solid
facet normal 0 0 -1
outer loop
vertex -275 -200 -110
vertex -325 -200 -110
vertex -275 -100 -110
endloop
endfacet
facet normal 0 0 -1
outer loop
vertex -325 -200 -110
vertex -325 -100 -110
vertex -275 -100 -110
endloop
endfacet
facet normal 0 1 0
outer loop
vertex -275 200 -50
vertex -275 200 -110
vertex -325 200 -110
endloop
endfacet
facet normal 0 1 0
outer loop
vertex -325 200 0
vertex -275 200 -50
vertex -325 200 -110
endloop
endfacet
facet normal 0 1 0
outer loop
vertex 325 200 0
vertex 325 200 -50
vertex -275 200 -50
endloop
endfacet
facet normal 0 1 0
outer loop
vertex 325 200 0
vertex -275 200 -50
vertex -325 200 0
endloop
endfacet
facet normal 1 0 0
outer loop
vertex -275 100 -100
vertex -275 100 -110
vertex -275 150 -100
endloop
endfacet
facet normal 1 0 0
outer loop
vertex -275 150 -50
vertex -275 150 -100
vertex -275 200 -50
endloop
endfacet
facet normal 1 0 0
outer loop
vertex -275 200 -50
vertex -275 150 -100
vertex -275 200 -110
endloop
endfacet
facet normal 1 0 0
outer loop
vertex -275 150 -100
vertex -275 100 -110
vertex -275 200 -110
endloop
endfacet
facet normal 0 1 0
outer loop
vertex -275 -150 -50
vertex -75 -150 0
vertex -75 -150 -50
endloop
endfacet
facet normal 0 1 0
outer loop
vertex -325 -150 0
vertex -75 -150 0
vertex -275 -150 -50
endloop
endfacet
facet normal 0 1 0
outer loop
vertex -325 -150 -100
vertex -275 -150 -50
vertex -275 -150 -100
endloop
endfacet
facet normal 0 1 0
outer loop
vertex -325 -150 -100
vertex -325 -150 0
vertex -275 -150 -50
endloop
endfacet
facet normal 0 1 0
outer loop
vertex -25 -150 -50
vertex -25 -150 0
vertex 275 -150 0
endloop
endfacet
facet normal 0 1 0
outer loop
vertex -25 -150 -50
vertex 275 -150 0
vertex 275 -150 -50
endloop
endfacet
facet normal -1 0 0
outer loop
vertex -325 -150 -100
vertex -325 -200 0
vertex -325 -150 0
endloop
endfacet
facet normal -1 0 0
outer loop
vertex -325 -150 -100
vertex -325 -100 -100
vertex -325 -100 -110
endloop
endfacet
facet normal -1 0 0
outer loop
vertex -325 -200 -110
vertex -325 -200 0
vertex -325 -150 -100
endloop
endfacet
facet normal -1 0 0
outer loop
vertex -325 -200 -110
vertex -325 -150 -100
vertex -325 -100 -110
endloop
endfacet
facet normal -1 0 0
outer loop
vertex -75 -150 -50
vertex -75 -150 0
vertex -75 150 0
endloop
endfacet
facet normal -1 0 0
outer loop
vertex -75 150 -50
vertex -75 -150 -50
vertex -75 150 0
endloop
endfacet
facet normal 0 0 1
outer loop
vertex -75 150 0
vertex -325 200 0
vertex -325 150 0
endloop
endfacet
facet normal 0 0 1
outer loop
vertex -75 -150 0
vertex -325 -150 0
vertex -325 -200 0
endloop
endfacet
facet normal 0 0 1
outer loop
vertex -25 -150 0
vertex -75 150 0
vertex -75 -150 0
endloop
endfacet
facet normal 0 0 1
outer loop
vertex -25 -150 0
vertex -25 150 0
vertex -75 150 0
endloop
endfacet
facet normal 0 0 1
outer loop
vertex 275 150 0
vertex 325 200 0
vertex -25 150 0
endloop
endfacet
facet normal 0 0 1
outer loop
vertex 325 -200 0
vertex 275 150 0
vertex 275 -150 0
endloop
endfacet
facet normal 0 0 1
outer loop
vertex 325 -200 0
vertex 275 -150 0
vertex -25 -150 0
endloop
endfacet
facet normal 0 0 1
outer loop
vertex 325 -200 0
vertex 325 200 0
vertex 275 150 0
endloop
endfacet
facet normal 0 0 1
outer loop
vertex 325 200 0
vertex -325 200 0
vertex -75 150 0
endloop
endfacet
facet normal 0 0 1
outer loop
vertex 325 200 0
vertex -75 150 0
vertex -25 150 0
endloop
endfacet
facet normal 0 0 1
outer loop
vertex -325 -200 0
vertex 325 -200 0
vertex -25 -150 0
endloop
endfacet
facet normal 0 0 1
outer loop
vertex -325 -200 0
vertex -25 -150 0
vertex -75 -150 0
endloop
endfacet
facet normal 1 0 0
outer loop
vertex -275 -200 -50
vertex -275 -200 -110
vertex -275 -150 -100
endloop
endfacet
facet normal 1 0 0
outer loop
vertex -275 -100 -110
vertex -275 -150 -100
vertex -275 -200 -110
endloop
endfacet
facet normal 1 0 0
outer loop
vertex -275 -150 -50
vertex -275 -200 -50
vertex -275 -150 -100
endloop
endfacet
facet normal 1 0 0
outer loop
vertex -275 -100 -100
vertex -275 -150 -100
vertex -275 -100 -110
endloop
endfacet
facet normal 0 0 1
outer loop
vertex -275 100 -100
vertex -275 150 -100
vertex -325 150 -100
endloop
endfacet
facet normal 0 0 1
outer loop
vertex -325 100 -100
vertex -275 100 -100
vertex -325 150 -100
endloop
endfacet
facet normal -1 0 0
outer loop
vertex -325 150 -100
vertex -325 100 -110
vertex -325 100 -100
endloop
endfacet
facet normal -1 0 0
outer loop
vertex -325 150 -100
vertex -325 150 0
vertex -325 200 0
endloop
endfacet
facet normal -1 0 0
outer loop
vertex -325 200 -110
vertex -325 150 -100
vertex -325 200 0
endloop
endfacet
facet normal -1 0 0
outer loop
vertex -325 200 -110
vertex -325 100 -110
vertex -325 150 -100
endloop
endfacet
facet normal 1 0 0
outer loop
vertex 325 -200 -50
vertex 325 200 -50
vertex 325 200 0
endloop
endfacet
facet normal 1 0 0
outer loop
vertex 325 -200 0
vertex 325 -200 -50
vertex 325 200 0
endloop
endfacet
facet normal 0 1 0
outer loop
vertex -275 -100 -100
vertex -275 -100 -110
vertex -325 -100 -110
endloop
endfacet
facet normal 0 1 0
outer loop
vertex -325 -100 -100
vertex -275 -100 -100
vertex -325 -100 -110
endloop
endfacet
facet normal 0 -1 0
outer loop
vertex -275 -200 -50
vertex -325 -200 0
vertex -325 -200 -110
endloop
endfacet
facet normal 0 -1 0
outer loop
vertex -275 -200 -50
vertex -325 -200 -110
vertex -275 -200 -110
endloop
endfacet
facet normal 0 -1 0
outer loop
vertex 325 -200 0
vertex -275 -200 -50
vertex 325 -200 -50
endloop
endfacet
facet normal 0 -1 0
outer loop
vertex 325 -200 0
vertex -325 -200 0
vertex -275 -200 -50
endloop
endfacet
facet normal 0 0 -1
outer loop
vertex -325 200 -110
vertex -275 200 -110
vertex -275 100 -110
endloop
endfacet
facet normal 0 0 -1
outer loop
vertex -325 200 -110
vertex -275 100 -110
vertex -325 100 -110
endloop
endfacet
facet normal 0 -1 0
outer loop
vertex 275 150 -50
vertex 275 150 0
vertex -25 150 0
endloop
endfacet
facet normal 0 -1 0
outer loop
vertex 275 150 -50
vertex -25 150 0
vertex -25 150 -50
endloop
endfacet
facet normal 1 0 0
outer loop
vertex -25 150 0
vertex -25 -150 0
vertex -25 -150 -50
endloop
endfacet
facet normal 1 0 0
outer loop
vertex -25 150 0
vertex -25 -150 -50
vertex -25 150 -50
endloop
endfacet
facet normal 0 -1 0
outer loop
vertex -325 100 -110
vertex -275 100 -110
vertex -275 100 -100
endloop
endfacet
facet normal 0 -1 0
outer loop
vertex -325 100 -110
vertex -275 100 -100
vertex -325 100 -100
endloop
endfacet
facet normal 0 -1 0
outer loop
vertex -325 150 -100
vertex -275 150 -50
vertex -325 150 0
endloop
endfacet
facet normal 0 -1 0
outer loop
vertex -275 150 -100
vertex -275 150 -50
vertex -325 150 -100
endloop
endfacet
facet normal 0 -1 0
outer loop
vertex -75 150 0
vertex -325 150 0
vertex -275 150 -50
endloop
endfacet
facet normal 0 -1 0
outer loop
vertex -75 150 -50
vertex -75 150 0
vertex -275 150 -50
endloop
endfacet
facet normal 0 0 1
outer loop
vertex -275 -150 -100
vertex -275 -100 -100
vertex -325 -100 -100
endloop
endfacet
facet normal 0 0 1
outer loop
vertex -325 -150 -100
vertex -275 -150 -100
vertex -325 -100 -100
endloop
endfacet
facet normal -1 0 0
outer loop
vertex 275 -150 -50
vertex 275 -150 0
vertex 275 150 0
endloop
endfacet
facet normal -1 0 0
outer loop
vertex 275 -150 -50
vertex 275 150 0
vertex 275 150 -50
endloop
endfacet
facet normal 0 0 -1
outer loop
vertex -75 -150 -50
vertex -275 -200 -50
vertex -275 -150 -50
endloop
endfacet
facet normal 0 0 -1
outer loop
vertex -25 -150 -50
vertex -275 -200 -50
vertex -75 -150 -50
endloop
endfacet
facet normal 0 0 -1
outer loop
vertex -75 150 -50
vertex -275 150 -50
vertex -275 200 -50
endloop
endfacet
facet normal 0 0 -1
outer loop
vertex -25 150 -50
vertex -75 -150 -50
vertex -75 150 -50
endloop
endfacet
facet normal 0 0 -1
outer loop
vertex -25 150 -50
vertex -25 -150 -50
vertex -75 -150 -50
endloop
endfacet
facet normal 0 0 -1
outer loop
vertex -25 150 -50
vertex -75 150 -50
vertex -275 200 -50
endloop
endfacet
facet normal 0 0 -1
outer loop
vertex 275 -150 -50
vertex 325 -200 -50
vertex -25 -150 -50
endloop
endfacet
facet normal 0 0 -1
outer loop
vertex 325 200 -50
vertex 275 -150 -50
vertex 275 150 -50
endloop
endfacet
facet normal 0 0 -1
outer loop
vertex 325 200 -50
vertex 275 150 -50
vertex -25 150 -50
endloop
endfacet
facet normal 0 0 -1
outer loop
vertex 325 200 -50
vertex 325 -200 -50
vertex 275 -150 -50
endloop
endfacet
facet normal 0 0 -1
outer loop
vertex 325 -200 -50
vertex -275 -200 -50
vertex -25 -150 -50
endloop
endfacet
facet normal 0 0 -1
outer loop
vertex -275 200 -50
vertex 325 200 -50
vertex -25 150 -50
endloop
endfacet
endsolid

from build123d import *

# Parameters (mm, degrees)
SKETCH8_W           = 50
SKETCH8_H           = 50
SKETCH9_W           = 50
SKETCH9_H           = 50
BOSS_EXTRUDE1_DEPTH = 110
SKETCH10_W          = 50
SKETCH10_H          = 400
BOSS_EXTRUDE2_DEPTH = 50
SKETCH11_W          = 50
SKETCH11_H          = 100
BOSS_EXTRUDE3_DEPTH = 10


with BuildPart() as part:
    # Sweep1: sweep along a path in Sketch1
    with BuildLine(Plane.XY) as sweep1_path:
        Line((-325, 200), (325, 200))
        Line((325, 200), (325, -200))
        Line((325, -200), (-325, -200))
    # Sketch8 → Sweep1 (sweep)
    with BuildSketch(Plane(origin=(0, 0, 0), x_dir=(0, 0, -1), z_dir=(1, 0, 0))):
        with Locations((25, 175)):
            Rectangle(SKETCH8_W, SKETCH8_H)
    sweep(path=sweep1_path.line, transition=Transition.RIGHT)

    # Sketch9 → Boss-Extrude1 (add)
    with BuildSketch(Plane.XY):
        with Locations((-300, 175)):
            Rectangle(SKETCH9_W, SKETCH9_H)
        with Locations((-300, -175)):
            Rectangle(SKETCH9_W, SKETCH9_H)
    extrude(amount=-BOSS_EXTRUDE1_DEPTH)

    # Sketch10 → Boss-Extrude2 (add)
    with BuildSketch(Plane.XY):
        with Locations((-50, 0)):
            Rectangle(SKETCH10_W, SKETCH10_H)
    extrude(amount=-BOSS_EXTRUDE2_DEPTH)

    # Sketch11 → Boss-Extrude3 (add)
    with BuildSketch(Plane(origin=(0, 0, -110), x_dir=(-1, 0, 0), z_dir=(0, 0, -1))):
        with Locations((300, 150)):
            Rectangle(SKETCH11_W, SKETCH11_H)
        with Locations((300, -150)):
            Rectangle(SKETCH11_W, SKETCH11_H)
    extrude(amount=-BOSS_EXTRUDE3_DEPTH)


solid = part.part
